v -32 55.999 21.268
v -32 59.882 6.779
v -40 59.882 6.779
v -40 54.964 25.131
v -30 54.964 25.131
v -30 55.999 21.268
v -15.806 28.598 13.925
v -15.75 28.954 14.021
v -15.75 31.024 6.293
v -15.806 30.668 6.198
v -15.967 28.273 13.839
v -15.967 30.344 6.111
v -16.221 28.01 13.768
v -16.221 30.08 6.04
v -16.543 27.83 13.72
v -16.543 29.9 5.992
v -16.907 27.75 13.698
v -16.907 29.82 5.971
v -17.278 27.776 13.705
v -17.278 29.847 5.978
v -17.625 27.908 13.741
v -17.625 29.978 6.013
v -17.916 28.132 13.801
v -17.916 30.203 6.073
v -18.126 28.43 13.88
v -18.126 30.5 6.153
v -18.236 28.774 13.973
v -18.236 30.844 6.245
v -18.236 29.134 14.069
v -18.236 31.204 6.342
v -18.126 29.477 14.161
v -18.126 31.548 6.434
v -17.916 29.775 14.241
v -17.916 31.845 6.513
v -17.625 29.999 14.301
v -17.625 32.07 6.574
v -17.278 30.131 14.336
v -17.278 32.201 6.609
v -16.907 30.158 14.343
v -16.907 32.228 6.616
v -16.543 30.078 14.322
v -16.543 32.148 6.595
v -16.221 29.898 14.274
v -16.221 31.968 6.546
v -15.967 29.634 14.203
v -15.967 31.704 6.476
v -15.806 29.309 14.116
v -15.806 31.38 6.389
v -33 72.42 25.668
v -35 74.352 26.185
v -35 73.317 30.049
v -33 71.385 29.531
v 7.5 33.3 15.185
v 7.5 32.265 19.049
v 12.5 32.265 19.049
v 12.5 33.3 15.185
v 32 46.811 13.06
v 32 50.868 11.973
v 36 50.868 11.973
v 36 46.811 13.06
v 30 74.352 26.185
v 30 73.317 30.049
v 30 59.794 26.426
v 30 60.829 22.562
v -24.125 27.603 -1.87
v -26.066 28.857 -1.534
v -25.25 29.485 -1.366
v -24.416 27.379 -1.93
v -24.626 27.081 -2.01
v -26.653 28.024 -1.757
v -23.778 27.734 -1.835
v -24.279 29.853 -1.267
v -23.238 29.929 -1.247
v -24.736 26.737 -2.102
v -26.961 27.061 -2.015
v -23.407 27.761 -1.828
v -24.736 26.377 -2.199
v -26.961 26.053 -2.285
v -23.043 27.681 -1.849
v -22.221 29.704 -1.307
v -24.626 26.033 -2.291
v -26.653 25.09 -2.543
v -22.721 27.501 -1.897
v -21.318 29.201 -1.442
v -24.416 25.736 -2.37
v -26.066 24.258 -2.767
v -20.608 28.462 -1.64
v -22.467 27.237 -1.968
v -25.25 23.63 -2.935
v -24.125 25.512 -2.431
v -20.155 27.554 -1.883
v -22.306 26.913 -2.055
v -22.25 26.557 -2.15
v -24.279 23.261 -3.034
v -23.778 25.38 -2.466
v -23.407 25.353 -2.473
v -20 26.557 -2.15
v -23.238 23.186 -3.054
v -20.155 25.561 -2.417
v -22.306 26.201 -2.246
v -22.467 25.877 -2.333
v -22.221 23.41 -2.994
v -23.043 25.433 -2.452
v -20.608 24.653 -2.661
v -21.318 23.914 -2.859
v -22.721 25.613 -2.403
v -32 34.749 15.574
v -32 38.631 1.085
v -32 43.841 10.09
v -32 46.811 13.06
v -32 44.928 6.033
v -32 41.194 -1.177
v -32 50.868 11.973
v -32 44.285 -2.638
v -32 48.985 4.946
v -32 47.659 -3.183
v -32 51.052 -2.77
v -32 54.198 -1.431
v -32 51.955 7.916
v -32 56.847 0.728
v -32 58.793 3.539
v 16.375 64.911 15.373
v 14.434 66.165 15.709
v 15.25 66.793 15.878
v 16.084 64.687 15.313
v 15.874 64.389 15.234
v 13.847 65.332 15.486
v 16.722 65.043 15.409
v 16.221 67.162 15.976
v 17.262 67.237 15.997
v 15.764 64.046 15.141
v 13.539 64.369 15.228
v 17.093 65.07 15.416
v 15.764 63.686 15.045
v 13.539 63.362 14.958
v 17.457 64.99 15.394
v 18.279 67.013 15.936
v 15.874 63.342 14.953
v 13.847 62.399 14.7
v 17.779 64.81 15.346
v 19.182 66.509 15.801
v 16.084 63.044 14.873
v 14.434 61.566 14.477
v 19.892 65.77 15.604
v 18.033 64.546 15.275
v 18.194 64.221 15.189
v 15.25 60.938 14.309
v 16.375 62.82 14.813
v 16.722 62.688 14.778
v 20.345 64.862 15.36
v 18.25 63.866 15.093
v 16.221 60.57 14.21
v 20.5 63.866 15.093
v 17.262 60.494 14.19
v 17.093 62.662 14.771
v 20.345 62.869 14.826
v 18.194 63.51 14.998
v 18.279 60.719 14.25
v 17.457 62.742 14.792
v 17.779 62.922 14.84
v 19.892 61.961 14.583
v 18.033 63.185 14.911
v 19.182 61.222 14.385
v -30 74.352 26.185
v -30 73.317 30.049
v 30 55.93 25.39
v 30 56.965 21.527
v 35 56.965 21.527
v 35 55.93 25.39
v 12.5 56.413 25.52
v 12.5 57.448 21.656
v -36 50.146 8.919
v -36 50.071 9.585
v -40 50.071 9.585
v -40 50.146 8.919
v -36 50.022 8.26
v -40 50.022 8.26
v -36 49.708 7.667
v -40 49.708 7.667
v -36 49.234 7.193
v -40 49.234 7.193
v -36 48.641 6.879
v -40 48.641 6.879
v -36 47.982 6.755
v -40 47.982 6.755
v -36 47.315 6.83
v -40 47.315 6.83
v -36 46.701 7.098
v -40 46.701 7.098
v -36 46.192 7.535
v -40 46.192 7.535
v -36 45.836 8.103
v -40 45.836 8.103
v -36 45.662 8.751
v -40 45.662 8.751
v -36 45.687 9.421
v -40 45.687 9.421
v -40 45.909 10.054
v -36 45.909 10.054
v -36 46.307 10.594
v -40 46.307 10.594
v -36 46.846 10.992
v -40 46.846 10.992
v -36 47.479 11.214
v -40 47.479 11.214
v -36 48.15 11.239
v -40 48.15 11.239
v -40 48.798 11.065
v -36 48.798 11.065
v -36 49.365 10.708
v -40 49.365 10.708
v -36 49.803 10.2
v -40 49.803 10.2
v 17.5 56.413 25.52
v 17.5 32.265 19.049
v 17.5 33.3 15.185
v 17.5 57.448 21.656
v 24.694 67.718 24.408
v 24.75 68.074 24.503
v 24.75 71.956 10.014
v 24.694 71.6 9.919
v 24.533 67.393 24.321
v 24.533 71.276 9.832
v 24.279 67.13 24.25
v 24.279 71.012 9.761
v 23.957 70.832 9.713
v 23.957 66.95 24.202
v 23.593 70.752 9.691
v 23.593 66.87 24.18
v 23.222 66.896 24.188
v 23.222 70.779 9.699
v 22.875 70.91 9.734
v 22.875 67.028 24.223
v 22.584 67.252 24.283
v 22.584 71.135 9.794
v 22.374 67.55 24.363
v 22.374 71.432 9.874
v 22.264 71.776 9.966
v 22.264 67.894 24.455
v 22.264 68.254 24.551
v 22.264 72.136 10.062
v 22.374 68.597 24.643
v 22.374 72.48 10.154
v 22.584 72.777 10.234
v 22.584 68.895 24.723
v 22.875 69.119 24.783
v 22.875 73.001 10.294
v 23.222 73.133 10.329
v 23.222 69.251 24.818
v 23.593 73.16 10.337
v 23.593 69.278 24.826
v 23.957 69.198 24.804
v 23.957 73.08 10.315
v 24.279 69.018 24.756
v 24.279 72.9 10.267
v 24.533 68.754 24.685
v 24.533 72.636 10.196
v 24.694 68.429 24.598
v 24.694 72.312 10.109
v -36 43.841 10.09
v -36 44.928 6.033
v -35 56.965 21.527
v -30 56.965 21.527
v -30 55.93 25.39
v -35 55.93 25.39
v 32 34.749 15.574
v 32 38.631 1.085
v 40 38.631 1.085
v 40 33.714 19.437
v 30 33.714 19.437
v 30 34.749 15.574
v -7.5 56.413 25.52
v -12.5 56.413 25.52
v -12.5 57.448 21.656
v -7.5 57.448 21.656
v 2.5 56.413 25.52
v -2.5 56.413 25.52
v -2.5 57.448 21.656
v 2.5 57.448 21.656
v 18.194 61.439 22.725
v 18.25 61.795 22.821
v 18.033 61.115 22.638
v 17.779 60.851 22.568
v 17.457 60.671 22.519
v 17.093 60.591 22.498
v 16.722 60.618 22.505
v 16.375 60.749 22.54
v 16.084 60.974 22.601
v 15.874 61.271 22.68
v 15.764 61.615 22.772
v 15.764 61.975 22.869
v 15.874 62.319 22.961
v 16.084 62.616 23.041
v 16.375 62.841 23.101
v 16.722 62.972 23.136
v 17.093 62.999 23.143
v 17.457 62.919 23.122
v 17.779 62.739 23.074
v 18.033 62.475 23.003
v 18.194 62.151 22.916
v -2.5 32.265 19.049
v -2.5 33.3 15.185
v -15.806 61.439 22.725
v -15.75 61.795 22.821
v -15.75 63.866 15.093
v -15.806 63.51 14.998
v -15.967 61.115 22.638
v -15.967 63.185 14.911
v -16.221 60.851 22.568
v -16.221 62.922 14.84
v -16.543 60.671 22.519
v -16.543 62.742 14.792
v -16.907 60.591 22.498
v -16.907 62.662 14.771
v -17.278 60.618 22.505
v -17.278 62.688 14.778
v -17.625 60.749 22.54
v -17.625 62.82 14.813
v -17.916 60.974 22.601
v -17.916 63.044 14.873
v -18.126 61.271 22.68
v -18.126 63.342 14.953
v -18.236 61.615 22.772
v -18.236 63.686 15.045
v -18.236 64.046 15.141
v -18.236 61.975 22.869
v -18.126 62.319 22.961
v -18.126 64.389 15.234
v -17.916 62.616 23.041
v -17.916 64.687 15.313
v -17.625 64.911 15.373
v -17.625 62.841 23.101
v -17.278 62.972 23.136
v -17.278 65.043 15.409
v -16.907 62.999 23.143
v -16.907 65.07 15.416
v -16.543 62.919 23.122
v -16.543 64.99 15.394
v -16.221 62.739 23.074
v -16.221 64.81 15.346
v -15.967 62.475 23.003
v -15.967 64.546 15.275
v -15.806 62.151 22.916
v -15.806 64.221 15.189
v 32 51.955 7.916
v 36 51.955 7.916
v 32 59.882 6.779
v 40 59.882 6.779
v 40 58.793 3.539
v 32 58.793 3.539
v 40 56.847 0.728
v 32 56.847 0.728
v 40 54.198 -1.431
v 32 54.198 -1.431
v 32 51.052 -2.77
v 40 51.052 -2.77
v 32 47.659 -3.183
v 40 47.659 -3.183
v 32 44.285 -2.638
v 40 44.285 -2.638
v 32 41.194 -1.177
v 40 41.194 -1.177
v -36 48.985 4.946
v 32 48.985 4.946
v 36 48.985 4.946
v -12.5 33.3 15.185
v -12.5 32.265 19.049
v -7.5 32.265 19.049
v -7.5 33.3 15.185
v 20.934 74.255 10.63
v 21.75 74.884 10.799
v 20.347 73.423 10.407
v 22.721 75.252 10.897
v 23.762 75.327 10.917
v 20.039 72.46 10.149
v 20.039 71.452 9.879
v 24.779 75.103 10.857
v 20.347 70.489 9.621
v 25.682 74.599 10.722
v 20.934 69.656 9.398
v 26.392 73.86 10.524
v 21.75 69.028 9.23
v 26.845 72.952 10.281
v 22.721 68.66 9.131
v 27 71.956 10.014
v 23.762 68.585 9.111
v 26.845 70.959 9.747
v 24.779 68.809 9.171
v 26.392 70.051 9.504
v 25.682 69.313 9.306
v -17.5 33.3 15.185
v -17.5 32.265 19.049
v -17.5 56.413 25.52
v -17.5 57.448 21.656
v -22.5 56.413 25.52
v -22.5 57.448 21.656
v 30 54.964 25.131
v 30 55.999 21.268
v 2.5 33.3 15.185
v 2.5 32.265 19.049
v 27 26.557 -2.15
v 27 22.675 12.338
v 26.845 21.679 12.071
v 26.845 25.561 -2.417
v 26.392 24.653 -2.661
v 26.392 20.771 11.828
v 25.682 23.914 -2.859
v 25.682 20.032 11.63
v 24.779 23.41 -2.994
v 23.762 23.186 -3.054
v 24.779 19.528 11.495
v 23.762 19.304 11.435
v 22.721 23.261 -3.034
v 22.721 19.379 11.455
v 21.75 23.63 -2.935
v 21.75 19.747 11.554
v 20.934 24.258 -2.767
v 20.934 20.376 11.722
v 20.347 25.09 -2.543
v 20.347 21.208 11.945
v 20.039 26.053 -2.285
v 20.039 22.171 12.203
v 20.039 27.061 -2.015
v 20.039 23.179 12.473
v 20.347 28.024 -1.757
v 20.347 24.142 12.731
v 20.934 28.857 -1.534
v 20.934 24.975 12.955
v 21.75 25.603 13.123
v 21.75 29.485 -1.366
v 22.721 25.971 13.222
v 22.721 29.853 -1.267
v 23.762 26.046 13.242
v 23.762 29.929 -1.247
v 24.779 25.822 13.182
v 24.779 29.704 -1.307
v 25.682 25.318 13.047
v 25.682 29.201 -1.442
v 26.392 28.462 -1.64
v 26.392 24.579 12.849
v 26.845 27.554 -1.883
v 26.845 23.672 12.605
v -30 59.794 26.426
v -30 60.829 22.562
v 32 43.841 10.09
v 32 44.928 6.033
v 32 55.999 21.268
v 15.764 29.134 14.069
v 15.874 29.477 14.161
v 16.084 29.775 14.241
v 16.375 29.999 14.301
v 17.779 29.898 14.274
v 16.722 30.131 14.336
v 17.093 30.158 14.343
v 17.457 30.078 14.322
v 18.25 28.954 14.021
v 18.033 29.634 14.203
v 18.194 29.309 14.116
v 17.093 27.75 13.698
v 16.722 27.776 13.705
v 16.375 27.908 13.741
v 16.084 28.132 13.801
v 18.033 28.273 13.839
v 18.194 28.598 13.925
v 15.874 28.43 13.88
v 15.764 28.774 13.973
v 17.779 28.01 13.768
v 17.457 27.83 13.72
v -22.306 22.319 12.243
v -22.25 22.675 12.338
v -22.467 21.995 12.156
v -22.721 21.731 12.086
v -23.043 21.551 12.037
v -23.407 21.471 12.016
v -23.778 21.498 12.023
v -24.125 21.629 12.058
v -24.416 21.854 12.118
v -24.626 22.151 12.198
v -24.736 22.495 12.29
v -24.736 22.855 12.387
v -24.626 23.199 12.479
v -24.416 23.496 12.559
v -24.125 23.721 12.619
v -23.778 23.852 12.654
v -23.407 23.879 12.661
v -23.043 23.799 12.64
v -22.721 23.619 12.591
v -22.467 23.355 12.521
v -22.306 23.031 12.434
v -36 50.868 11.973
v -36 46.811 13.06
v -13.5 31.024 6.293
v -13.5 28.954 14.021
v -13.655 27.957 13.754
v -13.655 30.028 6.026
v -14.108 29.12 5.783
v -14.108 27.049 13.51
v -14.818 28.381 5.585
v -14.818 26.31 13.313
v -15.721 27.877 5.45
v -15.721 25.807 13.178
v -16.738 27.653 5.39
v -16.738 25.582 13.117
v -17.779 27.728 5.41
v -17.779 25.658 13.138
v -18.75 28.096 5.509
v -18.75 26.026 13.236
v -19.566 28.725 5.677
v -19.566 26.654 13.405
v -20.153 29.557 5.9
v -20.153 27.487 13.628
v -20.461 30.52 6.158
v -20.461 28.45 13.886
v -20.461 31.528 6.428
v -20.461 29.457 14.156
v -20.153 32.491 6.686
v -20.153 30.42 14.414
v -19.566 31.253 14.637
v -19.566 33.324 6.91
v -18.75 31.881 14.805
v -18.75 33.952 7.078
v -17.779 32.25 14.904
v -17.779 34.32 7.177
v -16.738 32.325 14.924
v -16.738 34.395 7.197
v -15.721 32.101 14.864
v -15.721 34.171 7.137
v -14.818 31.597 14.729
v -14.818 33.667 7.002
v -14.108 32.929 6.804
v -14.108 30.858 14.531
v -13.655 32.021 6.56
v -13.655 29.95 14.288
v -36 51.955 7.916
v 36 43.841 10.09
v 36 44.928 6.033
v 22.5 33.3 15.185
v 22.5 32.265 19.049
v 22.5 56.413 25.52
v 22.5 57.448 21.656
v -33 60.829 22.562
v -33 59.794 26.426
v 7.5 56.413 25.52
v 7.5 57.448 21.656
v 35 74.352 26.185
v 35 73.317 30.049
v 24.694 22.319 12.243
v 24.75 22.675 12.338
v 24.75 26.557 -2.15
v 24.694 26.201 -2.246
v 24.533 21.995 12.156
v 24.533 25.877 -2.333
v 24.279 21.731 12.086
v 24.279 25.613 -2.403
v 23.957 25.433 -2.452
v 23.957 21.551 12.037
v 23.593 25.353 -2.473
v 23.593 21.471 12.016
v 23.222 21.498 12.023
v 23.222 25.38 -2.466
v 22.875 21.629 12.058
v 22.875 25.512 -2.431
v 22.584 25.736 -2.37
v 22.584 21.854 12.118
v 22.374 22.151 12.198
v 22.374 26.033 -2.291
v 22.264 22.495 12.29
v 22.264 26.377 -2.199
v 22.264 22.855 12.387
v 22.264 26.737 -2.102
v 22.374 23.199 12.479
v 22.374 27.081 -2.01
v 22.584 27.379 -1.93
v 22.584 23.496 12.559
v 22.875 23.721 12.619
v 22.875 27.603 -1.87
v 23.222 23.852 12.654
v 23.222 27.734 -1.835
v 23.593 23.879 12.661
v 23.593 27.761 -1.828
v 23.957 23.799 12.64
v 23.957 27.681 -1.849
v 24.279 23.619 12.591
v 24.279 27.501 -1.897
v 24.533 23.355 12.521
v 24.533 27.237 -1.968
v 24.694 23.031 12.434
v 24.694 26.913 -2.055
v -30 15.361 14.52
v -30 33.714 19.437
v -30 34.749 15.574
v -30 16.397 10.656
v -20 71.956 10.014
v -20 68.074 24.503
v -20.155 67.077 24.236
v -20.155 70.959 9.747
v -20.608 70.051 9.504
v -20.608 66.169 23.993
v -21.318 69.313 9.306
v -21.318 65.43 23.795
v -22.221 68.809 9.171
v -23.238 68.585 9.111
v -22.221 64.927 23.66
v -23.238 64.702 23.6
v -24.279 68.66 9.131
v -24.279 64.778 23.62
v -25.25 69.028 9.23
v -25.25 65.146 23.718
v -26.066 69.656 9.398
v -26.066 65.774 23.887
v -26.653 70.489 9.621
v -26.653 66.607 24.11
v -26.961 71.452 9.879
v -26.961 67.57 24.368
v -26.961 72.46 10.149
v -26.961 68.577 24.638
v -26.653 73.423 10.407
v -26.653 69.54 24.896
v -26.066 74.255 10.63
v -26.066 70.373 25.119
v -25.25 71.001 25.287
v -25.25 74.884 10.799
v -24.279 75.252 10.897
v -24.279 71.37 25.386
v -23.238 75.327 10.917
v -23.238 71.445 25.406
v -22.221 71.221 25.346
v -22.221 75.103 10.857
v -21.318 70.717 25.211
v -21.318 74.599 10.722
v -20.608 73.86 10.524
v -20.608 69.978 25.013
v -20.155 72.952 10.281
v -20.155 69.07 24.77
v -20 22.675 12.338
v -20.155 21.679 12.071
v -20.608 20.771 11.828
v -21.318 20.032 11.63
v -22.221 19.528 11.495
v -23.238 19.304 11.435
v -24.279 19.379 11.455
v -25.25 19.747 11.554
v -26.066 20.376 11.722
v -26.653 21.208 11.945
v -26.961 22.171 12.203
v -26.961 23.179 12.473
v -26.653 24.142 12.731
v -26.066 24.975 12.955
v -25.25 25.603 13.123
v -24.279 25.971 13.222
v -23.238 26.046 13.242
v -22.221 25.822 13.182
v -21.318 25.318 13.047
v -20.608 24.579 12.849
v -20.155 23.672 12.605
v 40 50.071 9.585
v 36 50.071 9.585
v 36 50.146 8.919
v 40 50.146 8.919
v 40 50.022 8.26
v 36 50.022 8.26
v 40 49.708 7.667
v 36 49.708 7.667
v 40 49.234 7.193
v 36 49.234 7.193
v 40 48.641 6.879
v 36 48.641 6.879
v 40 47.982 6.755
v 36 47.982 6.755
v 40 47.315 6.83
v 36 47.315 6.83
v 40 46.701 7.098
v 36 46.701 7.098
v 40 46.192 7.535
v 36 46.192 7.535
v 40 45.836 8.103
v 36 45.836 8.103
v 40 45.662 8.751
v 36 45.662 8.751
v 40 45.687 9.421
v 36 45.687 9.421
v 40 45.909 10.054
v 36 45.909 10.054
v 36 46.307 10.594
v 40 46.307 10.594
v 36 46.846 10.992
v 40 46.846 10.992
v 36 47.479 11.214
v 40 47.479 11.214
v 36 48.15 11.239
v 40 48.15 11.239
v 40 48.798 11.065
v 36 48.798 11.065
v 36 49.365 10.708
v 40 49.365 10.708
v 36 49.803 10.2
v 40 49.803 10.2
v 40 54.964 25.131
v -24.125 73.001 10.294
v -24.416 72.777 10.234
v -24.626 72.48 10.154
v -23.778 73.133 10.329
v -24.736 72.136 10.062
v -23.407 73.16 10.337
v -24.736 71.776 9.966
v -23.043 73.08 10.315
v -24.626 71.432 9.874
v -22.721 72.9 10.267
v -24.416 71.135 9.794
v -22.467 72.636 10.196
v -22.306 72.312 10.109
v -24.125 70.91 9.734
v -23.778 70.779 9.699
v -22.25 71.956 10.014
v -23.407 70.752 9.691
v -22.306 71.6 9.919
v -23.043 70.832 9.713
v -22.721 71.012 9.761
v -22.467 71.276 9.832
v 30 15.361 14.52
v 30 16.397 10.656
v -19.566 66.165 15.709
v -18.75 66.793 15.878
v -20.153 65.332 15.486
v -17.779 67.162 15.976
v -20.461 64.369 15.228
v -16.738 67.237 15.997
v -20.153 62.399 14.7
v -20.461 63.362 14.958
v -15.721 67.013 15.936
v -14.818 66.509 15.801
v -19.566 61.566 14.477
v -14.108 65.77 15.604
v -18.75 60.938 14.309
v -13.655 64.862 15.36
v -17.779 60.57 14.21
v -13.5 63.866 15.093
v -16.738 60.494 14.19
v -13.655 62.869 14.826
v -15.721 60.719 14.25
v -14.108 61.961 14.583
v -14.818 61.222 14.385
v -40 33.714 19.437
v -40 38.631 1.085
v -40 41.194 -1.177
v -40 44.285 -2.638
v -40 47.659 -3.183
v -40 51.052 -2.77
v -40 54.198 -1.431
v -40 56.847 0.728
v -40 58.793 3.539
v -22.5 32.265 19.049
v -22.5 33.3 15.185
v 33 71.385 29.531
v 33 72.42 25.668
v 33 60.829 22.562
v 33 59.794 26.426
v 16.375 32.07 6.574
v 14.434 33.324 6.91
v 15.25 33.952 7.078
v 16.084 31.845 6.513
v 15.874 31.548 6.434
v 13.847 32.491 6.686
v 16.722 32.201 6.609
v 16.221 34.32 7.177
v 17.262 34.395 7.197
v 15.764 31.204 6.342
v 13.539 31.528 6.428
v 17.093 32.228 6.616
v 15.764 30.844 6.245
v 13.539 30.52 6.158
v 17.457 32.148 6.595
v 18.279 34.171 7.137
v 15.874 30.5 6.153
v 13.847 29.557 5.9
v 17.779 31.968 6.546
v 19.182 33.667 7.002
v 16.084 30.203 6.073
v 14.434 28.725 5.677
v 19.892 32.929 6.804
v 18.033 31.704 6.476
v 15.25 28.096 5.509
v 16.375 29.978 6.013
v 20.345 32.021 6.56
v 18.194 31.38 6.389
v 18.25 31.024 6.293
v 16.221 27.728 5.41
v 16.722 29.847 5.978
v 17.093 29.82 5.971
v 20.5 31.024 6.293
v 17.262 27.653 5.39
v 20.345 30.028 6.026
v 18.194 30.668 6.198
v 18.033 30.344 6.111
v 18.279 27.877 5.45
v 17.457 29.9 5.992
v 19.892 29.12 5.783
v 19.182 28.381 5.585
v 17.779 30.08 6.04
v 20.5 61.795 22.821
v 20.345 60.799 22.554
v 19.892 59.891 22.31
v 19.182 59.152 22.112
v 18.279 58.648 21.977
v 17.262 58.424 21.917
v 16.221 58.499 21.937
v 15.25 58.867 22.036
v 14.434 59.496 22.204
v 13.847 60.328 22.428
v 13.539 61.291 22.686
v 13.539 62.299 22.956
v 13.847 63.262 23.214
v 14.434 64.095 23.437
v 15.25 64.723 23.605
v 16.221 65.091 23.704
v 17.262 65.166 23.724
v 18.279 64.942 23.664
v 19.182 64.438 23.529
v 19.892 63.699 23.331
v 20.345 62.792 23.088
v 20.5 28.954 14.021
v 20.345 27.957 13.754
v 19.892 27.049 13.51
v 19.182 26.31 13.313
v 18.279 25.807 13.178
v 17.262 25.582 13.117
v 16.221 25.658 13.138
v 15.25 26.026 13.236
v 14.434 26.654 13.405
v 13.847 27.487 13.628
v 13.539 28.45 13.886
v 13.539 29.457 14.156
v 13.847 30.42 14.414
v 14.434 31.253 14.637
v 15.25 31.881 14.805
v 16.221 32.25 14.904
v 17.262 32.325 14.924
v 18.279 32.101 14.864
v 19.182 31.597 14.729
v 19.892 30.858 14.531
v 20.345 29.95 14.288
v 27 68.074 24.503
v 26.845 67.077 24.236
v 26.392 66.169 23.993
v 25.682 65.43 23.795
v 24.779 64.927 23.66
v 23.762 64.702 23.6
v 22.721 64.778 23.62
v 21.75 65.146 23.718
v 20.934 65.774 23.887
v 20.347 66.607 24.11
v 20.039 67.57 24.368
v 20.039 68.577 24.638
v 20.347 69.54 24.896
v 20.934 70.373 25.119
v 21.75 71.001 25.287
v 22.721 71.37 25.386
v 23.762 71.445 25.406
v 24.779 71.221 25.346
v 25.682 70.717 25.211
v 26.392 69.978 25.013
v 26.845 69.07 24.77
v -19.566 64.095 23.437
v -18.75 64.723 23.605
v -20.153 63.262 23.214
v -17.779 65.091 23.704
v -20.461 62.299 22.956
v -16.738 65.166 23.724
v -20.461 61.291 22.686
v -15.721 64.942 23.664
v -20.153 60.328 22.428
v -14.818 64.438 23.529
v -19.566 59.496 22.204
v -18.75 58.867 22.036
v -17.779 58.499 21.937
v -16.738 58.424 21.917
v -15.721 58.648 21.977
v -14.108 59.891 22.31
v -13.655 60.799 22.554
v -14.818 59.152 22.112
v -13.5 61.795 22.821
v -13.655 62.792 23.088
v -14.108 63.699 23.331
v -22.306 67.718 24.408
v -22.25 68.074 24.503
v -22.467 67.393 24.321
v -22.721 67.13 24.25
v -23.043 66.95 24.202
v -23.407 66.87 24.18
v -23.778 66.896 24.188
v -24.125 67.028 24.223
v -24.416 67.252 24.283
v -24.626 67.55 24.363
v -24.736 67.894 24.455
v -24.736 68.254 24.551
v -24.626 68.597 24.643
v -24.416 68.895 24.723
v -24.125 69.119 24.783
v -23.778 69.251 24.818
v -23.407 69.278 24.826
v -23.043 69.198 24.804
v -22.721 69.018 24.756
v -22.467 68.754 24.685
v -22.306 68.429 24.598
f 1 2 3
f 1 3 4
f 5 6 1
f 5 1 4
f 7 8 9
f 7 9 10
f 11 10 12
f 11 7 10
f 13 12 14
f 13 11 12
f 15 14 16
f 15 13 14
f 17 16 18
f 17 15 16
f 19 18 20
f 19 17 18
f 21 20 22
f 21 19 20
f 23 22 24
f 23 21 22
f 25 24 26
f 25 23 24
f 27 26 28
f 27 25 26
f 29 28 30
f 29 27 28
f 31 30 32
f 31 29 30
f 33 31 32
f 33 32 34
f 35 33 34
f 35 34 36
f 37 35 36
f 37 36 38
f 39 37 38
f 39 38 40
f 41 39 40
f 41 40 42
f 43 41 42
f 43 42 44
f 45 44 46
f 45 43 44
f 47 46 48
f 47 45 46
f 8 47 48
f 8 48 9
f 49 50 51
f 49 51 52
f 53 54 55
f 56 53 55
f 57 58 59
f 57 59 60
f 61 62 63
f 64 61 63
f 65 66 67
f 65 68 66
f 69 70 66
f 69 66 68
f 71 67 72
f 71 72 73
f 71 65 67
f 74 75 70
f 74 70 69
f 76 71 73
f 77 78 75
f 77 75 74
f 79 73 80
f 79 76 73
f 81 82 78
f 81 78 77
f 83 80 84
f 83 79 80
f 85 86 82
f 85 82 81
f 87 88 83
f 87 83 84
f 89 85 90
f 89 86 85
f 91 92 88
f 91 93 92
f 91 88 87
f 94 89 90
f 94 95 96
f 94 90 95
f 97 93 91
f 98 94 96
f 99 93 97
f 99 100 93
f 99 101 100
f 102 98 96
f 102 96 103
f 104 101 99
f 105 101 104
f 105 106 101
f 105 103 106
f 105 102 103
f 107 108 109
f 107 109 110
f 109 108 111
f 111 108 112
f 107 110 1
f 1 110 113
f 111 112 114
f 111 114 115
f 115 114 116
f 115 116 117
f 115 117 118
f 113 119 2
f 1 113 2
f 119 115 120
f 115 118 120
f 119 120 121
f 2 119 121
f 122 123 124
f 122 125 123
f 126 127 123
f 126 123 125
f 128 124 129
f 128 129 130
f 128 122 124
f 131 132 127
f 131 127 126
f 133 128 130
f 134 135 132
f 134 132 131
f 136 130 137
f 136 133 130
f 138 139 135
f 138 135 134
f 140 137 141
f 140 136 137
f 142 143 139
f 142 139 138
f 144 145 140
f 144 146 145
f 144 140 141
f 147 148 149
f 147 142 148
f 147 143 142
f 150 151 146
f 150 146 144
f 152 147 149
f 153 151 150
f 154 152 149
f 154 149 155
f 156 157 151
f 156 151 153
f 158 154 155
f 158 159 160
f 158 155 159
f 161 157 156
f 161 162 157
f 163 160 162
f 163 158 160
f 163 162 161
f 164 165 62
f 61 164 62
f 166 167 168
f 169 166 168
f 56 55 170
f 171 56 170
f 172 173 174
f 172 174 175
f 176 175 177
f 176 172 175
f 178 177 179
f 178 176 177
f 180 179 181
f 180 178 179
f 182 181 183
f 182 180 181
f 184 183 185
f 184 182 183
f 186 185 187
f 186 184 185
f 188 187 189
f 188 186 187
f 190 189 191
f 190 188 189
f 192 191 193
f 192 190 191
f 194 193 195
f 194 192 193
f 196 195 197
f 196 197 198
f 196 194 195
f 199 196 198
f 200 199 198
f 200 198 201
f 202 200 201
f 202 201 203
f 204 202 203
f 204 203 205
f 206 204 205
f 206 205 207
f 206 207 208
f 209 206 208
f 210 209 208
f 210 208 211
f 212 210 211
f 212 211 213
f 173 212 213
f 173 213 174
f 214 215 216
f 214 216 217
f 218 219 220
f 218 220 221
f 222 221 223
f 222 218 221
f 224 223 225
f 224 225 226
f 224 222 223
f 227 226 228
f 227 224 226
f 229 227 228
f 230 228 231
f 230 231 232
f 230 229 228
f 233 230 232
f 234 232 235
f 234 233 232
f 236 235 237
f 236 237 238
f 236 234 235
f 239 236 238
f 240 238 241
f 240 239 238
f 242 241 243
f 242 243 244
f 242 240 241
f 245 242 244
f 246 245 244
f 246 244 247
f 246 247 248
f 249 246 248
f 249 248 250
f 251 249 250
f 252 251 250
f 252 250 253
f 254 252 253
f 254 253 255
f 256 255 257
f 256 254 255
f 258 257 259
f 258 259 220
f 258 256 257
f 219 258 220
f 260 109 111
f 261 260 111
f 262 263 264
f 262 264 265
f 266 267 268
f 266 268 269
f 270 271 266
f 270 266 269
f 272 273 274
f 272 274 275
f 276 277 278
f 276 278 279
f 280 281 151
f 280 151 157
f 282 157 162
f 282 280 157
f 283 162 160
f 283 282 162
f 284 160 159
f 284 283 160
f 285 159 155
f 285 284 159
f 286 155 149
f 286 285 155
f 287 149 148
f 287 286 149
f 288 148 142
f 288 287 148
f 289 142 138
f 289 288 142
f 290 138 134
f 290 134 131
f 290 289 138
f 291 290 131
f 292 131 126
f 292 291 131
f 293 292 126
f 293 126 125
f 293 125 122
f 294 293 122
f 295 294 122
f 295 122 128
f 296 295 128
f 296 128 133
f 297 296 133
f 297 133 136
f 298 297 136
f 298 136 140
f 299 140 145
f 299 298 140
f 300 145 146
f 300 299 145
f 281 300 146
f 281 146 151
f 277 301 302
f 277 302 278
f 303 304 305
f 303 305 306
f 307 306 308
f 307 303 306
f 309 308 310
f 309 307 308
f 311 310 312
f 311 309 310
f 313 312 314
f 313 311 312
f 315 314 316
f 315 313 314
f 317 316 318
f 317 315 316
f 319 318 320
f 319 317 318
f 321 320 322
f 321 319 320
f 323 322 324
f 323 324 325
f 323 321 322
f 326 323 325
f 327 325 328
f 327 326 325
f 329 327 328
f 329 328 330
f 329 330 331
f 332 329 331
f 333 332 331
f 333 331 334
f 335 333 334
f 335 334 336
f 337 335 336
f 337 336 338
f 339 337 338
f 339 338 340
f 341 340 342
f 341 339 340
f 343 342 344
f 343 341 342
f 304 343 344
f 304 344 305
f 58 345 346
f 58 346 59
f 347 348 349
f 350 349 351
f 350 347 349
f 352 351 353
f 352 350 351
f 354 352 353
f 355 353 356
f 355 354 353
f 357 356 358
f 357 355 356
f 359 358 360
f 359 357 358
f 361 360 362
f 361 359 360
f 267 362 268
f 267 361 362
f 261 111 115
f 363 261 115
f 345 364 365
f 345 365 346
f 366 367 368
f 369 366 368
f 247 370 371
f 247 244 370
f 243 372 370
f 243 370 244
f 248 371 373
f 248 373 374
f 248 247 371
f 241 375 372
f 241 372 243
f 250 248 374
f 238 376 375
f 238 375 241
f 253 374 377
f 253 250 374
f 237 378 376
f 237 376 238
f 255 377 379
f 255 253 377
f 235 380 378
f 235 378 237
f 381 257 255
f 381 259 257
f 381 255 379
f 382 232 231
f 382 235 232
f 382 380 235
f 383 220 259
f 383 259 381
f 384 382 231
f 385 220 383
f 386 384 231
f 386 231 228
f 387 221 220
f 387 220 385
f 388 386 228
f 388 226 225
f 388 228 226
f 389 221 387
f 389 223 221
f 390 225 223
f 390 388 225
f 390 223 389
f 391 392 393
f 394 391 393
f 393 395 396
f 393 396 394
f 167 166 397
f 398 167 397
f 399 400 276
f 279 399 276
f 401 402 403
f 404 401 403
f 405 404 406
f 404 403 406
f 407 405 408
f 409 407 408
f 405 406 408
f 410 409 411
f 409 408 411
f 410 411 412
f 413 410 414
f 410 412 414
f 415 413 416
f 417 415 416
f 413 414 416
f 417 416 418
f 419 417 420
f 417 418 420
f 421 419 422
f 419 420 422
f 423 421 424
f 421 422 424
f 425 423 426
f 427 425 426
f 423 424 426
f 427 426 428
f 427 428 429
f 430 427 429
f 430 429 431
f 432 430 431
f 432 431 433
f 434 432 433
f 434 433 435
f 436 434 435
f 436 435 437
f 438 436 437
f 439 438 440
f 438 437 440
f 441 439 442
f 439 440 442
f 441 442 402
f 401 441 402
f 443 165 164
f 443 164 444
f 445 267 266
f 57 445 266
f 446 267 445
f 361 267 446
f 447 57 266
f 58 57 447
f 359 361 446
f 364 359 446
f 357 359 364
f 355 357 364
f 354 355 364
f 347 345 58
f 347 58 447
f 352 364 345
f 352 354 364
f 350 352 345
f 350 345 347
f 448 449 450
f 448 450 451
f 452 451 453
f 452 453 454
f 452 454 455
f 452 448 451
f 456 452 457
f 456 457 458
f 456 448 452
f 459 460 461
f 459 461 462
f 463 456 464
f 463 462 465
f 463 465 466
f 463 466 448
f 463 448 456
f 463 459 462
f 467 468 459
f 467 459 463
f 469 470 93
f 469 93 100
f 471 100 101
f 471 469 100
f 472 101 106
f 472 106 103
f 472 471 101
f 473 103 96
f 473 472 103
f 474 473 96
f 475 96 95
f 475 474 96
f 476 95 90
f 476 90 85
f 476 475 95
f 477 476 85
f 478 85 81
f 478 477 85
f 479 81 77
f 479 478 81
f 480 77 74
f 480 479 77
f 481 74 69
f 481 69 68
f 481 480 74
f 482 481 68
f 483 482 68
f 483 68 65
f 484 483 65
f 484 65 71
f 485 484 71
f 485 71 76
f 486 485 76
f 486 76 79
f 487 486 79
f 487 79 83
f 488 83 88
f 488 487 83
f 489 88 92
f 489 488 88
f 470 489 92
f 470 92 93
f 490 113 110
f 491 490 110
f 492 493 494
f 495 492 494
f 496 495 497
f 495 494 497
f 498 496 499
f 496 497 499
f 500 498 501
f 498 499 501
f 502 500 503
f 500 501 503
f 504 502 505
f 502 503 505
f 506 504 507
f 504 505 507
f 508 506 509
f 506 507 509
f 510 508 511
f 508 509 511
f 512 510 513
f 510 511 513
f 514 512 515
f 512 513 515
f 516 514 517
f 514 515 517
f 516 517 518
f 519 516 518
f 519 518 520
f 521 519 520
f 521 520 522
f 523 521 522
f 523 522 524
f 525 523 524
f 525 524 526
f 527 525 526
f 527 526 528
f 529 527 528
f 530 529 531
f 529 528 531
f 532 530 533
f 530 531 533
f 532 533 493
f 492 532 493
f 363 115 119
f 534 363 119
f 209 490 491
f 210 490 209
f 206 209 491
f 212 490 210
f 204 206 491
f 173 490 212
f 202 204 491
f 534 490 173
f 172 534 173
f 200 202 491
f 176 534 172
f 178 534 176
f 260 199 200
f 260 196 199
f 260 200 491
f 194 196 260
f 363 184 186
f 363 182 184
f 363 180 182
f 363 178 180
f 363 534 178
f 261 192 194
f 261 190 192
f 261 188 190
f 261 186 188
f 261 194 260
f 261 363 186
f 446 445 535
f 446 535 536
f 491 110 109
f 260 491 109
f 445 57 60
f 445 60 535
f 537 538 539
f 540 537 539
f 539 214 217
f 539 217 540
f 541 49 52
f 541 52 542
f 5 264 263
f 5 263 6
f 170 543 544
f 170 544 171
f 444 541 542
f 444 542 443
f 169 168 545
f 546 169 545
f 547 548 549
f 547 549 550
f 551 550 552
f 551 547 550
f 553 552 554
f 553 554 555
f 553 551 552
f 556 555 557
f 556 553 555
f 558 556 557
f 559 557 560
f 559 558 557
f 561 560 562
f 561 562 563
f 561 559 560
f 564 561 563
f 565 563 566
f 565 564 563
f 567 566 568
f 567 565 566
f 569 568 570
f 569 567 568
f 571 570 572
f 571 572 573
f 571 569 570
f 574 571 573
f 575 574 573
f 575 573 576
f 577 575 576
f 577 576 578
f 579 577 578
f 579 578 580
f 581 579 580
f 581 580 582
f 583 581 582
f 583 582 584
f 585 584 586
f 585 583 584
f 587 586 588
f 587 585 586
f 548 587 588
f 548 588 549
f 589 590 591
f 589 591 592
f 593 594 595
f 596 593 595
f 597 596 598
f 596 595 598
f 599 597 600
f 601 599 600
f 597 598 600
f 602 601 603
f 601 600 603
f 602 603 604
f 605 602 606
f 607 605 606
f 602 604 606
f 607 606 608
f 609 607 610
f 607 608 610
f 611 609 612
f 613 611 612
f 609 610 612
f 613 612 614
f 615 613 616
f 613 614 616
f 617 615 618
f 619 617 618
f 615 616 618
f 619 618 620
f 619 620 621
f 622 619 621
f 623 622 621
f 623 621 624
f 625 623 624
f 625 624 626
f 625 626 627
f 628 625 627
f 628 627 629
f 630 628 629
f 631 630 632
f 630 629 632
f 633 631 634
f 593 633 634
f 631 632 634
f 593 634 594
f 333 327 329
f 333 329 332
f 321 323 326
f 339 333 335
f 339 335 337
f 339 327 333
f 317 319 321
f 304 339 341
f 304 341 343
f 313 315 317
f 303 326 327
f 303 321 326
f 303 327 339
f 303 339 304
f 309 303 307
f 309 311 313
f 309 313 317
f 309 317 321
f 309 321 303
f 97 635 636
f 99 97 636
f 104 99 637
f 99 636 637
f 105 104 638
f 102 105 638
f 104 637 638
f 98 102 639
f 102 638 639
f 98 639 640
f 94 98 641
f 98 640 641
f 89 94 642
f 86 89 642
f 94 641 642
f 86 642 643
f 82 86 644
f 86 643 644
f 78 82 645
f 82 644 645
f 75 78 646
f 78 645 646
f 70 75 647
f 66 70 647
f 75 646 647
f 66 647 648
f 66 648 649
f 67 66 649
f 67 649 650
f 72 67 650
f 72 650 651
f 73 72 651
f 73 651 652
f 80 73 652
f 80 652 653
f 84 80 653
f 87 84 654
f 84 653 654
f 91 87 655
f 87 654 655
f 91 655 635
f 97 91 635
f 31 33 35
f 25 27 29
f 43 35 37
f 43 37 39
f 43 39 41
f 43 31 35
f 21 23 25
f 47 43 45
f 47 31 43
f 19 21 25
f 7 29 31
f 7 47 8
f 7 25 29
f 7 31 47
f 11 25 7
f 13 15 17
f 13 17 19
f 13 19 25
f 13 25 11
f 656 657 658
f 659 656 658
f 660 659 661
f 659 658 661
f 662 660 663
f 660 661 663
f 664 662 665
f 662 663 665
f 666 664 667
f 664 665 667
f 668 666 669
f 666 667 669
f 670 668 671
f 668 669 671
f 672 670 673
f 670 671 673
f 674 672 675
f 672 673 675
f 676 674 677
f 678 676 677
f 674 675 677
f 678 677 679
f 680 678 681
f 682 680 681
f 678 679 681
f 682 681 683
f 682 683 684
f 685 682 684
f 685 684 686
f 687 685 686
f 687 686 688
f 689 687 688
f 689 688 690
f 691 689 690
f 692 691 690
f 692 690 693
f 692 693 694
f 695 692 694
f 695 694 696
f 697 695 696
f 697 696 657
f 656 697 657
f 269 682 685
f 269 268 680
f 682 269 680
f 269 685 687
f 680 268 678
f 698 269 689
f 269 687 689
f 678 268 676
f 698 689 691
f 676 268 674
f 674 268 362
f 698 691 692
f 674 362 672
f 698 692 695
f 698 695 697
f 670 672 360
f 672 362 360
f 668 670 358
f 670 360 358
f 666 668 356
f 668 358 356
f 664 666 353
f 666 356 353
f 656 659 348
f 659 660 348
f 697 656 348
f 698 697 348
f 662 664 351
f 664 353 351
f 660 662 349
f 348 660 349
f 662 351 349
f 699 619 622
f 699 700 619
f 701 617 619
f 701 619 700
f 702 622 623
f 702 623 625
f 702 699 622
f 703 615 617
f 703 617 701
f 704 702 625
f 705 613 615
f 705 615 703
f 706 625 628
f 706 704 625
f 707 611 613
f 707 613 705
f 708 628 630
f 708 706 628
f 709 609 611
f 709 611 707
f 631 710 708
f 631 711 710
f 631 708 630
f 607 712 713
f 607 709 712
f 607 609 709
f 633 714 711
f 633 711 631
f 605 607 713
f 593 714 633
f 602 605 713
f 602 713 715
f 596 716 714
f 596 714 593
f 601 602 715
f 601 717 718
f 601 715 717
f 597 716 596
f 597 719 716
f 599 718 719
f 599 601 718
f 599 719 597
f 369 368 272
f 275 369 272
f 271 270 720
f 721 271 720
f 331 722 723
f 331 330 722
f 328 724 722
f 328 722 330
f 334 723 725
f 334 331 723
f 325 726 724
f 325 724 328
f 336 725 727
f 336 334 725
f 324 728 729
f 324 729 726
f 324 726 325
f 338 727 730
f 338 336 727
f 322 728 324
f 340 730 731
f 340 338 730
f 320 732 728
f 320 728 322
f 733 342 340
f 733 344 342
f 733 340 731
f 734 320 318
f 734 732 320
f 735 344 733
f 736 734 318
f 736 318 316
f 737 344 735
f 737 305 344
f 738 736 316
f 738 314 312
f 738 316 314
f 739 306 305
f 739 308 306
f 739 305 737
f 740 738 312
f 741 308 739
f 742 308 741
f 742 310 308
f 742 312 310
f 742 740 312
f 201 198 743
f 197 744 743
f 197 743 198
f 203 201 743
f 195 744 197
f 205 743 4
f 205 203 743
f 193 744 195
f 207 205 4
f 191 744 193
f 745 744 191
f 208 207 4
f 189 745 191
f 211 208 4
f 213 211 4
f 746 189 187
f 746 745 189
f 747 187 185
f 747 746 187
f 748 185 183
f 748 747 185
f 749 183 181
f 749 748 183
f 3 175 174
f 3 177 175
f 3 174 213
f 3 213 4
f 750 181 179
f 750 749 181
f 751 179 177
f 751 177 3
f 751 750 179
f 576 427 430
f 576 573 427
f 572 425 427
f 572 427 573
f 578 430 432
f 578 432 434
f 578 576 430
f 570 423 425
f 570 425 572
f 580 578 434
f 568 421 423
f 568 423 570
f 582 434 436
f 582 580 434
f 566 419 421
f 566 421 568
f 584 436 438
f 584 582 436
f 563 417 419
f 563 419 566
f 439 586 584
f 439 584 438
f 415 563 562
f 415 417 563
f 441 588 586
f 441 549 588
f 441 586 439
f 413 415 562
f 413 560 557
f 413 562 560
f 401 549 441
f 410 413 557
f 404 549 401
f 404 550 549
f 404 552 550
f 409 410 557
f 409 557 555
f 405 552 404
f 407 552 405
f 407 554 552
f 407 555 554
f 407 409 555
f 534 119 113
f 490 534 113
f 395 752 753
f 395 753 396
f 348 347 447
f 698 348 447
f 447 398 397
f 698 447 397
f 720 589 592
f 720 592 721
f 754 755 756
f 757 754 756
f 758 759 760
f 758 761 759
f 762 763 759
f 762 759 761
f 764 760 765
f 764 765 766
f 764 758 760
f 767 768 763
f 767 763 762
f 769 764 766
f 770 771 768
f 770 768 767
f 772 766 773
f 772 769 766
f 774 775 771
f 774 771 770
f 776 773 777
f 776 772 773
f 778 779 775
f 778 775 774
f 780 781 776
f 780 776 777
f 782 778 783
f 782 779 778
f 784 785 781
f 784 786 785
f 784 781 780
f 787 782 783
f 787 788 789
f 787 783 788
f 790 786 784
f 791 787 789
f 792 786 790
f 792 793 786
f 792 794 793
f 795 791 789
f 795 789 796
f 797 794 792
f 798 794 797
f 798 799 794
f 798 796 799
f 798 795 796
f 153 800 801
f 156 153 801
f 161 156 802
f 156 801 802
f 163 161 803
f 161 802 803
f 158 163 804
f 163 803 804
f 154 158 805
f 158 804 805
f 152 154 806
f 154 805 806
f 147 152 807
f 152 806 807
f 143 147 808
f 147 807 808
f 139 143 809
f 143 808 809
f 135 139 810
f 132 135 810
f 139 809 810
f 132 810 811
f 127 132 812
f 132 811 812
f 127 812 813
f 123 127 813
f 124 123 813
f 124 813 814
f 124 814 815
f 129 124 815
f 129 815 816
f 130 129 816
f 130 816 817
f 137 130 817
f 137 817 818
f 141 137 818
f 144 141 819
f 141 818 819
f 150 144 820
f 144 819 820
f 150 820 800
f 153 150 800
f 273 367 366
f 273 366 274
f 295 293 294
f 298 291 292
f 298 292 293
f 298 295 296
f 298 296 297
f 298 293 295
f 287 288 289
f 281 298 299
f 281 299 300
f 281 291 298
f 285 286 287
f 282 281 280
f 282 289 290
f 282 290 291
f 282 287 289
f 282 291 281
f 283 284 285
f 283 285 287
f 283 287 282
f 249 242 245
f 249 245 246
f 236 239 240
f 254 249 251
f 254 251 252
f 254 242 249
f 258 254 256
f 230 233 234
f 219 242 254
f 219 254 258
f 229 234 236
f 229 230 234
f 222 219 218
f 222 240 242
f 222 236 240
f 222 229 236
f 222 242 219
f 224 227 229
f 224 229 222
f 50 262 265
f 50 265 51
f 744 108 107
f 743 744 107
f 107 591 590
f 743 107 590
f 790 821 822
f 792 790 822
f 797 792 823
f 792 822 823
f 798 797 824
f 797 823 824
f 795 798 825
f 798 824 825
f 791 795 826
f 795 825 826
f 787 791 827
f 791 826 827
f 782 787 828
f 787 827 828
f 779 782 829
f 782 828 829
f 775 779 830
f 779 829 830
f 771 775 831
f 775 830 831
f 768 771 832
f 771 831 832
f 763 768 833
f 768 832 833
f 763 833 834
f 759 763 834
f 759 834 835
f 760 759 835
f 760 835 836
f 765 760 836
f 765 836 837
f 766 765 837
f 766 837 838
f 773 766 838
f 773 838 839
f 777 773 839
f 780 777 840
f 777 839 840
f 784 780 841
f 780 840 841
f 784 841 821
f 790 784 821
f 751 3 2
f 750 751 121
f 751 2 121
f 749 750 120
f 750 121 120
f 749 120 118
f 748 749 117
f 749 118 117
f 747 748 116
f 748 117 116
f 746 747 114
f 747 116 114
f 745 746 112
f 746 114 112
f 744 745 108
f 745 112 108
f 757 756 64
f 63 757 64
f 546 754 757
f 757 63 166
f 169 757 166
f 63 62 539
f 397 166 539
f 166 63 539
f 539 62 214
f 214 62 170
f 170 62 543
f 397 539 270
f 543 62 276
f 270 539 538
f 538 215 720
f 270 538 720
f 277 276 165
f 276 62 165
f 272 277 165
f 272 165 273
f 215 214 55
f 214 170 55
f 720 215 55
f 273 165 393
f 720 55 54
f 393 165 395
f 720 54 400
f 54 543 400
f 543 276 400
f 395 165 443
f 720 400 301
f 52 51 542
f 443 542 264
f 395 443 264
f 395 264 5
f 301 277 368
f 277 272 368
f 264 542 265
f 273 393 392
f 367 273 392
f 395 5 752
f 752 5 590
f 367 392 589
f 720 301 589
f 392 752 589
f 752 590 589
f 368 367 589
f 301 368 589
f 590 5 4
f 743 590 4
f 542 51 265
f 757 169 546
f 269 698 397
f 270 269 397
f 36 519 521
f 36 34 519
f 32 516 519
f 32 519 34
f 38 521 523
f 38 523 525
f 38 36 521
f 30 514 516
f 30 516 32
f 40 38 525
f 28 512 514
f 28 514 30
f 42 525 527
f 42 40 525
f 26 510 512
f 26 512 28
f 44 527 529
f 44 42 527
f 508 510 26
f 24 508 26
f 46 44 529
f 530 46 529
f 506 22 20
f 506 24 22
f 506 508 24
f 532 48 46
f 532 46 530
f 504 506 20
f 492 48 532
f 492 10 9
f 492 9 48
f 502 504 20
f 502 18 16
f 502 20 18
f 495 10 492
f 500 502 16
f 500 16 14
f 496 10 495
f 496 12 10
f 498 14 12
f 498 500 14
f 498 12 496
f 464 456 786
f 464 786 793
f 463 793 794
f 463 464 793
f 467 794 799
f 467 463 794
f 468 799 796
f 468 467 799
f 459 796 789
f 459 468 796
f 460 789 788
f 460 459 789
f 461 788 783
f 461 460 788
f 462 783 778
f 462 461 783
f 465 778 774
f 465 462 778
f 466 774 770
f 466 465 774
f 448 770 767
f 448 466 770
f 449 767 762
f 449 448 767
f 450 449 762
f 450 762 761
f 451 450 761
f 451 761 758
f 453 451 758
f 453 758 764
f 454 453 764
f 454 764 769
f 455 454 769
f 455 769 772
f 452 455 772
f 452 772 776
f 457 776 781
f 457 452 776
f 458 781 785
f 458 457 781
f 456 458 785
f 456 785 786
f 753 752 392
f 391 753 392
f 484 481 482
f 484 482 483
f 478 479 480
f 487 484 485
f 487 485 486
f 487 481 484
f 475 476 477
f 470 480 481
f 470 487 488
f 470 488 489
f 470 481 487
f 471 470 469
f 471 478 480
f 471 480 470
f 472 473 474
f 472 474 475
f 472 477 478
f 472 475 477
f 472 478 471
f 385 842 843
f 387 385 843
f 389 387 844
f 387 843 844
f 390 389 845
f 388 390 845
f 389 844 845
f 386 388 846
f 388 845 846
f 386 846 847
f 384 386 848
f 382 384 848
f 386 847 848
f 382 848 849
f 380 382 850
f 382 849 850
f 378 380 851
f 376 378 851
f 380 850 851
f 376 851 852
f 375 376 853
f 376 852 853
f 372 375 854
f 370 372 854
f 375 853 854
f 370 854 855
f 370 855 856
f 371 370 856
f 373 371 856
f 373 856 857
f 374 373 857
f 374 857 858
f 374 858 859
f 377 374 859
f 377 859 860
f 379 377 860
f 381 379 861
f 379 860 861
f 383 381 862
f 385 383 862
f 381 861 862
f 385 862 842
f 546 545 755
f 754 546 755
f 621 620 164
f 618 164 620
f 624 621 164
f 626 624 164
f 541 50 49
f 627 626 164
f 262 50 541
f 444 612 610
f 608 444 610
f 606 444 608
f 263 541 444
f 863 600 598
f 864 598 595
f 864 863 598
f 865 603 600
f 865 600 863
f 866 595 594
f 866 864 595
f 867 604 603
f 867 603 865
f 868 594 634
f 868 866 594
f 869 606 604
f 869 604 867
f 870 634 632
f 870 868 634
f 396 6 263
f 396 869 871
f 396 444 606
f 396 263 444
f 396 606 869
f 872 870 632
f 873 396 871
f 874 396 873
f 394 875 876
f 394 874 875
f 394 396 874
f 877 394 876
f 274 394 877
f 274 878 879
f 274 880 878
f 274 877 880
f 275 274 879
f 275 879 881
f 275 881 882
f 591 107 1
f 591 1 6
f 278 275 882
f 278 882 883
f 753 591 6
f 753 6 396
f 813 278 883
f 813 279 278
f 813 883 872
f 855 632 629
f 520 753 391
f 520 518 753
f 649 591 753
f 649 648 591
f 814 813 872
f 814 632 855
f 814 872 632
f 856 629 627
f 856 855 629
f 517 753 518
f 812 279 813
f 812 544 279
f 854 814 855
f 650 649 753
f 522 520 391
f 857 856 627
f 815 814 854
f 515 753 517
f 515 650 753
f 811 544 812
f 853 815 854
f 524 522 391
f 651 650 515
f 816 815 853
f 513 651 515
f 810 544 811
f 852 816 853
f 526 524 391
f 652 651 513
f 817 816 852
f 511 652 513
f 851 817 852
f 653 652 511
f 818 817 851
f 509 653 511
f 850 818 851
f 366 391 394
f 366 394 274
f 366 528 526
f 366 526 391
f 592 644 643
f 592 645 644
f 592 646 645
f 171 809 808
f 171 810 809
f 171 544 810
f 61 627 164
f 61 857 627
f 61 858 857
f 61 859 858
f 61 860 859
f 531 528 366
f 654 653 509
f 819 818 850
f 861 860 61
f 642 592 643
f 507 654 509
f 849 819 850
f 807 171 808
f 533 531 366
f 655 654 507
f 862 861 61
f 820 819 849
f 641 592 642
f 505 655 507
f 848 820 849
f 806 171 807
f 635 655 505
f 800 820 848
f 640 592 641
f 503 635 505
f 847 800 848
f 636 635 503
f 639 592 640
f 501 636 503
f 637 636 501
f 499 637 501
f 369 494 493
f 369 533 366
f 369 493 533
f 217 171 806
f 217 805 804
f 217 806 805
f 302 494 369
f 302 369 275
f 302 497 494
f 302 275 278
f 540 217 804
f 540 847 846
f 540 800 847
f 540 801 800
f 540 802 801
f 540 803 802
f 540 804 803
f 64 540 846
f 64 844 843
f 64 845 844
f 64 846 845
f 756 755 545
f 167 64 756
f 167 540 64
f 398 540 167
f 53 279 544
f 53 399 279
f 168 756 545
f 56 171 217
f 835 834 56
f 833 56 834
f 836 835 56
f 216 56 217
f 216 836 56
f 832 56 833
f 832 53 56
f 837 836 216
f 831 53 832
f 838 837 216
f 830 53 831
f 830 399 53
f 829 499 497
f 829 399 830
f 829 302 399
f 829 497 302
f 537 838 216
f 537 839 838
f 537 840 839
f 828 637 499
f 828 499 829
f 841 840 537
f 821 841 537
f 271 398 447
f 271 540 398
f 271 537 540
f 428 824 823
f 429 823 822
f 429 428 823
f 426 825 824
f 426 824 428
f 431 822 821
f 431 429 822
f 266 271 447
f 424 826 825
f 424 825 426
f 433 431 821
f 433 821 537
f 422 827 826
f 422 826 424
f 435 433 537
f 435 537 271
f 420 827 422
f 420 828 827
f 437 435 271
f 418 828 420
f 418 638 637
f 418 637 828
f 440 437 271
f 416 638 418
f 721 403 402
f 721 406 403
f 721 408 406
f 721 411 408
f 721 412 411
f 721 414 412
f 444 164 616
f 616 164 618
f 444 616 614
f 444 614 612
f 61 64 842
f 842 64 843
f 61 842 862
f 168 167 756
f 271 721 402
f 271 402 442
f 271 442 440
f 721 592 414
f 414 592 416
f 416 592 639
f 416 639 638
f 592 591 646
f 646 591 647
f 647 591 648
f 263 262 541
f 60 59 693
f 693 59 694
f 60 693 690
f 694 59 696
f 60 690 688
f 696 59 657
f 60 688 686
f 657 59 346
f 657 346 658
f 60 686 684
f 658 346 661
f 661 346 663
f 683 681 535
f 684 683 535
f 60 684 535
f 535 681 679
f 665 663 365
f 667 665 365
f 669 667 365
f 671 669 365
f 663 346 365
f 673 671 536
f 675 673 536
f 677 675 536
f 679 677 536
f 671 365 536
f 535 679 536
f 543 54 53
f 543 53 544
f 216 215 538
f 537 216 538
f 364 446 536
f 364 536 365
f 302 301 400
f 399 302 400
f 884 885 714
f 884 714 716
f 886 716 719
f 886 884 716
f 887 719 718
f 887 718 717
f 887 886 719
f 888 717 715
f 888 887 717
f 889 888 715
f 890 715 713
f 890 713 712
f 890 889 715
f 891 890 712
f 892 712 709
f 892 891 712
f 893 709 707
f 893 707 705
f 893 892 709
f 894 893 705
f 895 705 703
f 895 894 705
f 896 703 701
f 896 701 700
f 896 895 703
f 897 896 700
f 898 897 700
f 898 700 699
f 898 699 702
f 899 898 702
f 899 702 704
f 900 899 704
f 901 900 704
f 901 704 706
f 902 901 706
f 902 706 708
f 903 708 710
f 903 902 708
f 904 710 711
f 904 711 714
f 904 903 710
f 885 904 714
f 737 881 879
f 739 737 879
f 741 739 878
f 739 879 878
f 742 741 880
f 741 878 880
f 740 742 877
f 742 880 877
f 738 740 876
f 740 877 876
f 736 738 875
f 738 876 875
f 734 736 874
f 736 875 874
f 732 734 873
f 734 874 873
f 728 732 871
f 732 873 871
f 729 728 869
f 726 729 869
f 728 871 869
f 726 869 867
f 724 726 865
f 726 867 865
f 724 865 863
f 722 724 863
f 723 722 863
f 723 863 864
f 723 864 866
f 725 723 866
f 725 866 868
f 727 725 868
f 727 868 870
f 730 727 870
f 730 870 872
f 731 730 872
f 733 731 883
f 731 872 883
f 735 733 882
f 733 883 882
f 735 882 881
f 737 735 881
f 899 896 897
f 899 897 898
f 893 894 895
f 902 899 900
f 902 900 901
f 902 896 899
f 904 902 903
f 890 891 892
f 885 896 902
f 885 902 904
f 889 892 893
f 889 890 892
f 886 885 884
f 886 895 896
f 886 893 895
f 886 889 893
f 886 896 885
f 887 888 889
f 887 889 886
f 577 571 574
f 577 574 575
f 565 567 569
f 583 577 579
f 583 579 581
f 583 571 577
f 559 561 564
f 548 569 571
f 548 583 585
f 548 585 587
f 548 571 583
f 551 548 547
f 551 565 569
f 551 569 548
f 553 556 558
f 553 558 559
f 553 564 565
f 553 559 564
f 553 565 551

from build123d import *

# Parameters (mm, degrees)
SKETCH_W             = 60
SKETCH_H             = 60
PAD_DEPTH            = 4
SKETCH001_R          = 3.5
SKETCH001_R_2        = 1.25
PAD001_DEPTH         = 8
SKETCH009_W          = 5
SKETCH009_H          = 25
POCKET008_DEPTH      = 4
PAD006_DEPTH         = 4
SKETCH015_W          = 22
SKETCH015_H          = 4
PAD007_DEPTH         = 2
SKETCH003_R          = 2.25
PAD008_DEPTH         = 8
SKETCH014_R          = 3.5
SKETCH014_R_2        = 1.25
PAD009_DEPTH         = 15
POCKET_DEPTH         = 4
BODY_PLACEMENT_ANGLE = 195


with BuildPart() as part:
    # Sketch → Pad (new body)
    with BuildSketch(Plane.XY):
        Rectangle(SKETCH_W, SKETCH_H)
    extrude(amount=PAD_DEPTH)

    # Sketch001 (on Face6 of Pad) → Pad001 (join)
    with BuildSketch(Plane.XY.offset(4)):
        with Locations((-17, 17)):
            Circle(SKETCH001_R)
        with Locations((-17, 17)):
            Circle(SKETCH001_R_2, mode=Mode.SUBTRACT)
        with Locations((-17, -17)):
            Circle(SKETCH001_R)
        with Locations((-17, -17)):
            Circle(SKETCH001_R_2, mode=Mode.SUBTRACT)
        with Locations((17, -17)):
            Circle(SKETCH001_R)
        with Locations((17, -17)):
            Circle(SKETCH001_R_2, mode=Mode.SUBTRACT)
        with Locations((17, 17)):
            Circle(SKETCH001_R)
        with Locations((17, 17)):
            Circle(SKETCH001_R_2, mode=Mode.SUBTRACT)
    extrude(amount=PAD001_DEPTH)

    # Sketch009 → Pocket008 (cut)
    with BuildSketch(Plane(origin=(0, 0, 0), x_dir=(1, 0, 0), z_dir=(0, 0, -1))):
        Rectangle(SKETCH009_W, SKETCH009_H)
        with Locations((10, 0)):
            Rectangle(SKETCH009_W, SKETCH009_H)
        with Locations((20, 0)):
            Rectangle(SKETCH009_W, SKETCH009_H)
        with Locations((-10, 0)):
            Rectangle(SKETCH009_W, SKETCH009_H)
        with Locations((-20, 0)):
            Rectangle(SKETCH009_W, SKETCH009_H)
    extrude(amount=-POCKET008_DEPTH, mode=Mode.SUBTRACT)

    # Sketch012 (on Face5 of Pocket008) → Pad006 (join)
    with BuildSketch(Plane.XY.offset(4)):
        Polygon((-30, -12), (-35, -12), (-35, -30), (-33, -28), (-33, -16), (-30, -16), align=None)
    pad006 = extrude(amount=-PAD006_DEPTH)

    # Mirrored005: Pad006 across Sketch012 V_Axis
    add(pad006.mirror(Plane(origin=(0, 0, 4), x_dir=(0, 0, 1), z_dir=(1, 0, 0))))

    # Sketch015 (on Face4 of Pad) → Pad007 (join)
    with BuildSketch(Plane(origin=(-30, 0, 0), x_dir=(0, -1, 0), z_dir=(-1, 0, 0))):
        with Locations((0, 2)):
            Rectangle(SKETCH015_W, SKETCH015_H)
    pad007 = extrude(amount=PAD007_DEPTH)

    # Sketch003 (on Face42 of Pad007) → Pad008 (join)
    with BuildSketch(Plane(origin=(-32, 0, 0), x_dir=(0, -1, 0), z_dir=(-1, 0, 0))):
        with BuildLine():
            ThreePointArc((11, 19), (0, 25.938622), (-11, 19))
            Line((-11, 19), (-11, 0))
            Line((11, 0), (-11, 0))
            Line((11, 19), (11, 0))
        make_face()
        with Locations((0, 13.75)):
            Circle(SKETCH003_R, mode=Mode.SUBTRACT)
    pad008 = extrude(amount=PAD008_DEPTH)

    # Sketch014 → Pad009 (join)
    with BuildSketch(Plane.XY.offset(4)):
        with Locations((-23.5, 23.5)):
            Circle(SKETCH014_R)
        with Locations((-23.5, 23.5)):
            Circle(SKETCH014_R_2, mode=Mode.SUBTRACT)
        with Locations((23.5, 23.5)):
            Circle(SKETCH014_R)
        with Locations((23.5, 23.5)):
            Circle(SKETCH014_R_2, mode=Mode.SUBTRACT)
        with Locations((23.5, -23.5)):
            Circle(SKETCH014_R)
        with Locations((23.5, -23.5)):
            Circle(SKETCH014_R_2, mode=Mode.SUBTRACT)
        with Locations((-23.5, -23.5)):
            Circle(SKETCH014_R)
        with Locations((-23.5, -23.5)):
            Circle(SKETCH014_R_2, mode=Mode.SUBTRACT)
    extrude(amount=PAD009_DEPTH)

    # Sketch016 (on Face58 of Pad009) → Pocket (cut)
    with BuildSketch(Plane.YZ.offset(-32)):
        Polygon((-3.637307, 15.85), (-3.637307, 11.65), (0, 9.55), (3.637307, 11.65), (3.637307, 15.85), (0, 17.95), align=None)
    pocket = extrude(amount=-POCKET_DEPTH, mode=Mode.SUBTRACT)

    # Mirrored: Pad007, Pad008 across YZ
    add(pad007.mirror(Plane.YZ))
    add(pad008.mirror(Plane.YZ))

    # Mirrored006: Pocket across YZ
    add(pocket.mirror(Plane.YZ), mode=Mode.SUBTRACT)


with BuildPart() as part_1:
    # Body placement: moved
    add(part.part.moved(Location((0, 44.339027, 22.284409))).rotate(Axis((0, 44.339027, 22.284409), (1, 0, 0)), BODY_PLACEMENT_ANGLE))


solid = part_1.part
